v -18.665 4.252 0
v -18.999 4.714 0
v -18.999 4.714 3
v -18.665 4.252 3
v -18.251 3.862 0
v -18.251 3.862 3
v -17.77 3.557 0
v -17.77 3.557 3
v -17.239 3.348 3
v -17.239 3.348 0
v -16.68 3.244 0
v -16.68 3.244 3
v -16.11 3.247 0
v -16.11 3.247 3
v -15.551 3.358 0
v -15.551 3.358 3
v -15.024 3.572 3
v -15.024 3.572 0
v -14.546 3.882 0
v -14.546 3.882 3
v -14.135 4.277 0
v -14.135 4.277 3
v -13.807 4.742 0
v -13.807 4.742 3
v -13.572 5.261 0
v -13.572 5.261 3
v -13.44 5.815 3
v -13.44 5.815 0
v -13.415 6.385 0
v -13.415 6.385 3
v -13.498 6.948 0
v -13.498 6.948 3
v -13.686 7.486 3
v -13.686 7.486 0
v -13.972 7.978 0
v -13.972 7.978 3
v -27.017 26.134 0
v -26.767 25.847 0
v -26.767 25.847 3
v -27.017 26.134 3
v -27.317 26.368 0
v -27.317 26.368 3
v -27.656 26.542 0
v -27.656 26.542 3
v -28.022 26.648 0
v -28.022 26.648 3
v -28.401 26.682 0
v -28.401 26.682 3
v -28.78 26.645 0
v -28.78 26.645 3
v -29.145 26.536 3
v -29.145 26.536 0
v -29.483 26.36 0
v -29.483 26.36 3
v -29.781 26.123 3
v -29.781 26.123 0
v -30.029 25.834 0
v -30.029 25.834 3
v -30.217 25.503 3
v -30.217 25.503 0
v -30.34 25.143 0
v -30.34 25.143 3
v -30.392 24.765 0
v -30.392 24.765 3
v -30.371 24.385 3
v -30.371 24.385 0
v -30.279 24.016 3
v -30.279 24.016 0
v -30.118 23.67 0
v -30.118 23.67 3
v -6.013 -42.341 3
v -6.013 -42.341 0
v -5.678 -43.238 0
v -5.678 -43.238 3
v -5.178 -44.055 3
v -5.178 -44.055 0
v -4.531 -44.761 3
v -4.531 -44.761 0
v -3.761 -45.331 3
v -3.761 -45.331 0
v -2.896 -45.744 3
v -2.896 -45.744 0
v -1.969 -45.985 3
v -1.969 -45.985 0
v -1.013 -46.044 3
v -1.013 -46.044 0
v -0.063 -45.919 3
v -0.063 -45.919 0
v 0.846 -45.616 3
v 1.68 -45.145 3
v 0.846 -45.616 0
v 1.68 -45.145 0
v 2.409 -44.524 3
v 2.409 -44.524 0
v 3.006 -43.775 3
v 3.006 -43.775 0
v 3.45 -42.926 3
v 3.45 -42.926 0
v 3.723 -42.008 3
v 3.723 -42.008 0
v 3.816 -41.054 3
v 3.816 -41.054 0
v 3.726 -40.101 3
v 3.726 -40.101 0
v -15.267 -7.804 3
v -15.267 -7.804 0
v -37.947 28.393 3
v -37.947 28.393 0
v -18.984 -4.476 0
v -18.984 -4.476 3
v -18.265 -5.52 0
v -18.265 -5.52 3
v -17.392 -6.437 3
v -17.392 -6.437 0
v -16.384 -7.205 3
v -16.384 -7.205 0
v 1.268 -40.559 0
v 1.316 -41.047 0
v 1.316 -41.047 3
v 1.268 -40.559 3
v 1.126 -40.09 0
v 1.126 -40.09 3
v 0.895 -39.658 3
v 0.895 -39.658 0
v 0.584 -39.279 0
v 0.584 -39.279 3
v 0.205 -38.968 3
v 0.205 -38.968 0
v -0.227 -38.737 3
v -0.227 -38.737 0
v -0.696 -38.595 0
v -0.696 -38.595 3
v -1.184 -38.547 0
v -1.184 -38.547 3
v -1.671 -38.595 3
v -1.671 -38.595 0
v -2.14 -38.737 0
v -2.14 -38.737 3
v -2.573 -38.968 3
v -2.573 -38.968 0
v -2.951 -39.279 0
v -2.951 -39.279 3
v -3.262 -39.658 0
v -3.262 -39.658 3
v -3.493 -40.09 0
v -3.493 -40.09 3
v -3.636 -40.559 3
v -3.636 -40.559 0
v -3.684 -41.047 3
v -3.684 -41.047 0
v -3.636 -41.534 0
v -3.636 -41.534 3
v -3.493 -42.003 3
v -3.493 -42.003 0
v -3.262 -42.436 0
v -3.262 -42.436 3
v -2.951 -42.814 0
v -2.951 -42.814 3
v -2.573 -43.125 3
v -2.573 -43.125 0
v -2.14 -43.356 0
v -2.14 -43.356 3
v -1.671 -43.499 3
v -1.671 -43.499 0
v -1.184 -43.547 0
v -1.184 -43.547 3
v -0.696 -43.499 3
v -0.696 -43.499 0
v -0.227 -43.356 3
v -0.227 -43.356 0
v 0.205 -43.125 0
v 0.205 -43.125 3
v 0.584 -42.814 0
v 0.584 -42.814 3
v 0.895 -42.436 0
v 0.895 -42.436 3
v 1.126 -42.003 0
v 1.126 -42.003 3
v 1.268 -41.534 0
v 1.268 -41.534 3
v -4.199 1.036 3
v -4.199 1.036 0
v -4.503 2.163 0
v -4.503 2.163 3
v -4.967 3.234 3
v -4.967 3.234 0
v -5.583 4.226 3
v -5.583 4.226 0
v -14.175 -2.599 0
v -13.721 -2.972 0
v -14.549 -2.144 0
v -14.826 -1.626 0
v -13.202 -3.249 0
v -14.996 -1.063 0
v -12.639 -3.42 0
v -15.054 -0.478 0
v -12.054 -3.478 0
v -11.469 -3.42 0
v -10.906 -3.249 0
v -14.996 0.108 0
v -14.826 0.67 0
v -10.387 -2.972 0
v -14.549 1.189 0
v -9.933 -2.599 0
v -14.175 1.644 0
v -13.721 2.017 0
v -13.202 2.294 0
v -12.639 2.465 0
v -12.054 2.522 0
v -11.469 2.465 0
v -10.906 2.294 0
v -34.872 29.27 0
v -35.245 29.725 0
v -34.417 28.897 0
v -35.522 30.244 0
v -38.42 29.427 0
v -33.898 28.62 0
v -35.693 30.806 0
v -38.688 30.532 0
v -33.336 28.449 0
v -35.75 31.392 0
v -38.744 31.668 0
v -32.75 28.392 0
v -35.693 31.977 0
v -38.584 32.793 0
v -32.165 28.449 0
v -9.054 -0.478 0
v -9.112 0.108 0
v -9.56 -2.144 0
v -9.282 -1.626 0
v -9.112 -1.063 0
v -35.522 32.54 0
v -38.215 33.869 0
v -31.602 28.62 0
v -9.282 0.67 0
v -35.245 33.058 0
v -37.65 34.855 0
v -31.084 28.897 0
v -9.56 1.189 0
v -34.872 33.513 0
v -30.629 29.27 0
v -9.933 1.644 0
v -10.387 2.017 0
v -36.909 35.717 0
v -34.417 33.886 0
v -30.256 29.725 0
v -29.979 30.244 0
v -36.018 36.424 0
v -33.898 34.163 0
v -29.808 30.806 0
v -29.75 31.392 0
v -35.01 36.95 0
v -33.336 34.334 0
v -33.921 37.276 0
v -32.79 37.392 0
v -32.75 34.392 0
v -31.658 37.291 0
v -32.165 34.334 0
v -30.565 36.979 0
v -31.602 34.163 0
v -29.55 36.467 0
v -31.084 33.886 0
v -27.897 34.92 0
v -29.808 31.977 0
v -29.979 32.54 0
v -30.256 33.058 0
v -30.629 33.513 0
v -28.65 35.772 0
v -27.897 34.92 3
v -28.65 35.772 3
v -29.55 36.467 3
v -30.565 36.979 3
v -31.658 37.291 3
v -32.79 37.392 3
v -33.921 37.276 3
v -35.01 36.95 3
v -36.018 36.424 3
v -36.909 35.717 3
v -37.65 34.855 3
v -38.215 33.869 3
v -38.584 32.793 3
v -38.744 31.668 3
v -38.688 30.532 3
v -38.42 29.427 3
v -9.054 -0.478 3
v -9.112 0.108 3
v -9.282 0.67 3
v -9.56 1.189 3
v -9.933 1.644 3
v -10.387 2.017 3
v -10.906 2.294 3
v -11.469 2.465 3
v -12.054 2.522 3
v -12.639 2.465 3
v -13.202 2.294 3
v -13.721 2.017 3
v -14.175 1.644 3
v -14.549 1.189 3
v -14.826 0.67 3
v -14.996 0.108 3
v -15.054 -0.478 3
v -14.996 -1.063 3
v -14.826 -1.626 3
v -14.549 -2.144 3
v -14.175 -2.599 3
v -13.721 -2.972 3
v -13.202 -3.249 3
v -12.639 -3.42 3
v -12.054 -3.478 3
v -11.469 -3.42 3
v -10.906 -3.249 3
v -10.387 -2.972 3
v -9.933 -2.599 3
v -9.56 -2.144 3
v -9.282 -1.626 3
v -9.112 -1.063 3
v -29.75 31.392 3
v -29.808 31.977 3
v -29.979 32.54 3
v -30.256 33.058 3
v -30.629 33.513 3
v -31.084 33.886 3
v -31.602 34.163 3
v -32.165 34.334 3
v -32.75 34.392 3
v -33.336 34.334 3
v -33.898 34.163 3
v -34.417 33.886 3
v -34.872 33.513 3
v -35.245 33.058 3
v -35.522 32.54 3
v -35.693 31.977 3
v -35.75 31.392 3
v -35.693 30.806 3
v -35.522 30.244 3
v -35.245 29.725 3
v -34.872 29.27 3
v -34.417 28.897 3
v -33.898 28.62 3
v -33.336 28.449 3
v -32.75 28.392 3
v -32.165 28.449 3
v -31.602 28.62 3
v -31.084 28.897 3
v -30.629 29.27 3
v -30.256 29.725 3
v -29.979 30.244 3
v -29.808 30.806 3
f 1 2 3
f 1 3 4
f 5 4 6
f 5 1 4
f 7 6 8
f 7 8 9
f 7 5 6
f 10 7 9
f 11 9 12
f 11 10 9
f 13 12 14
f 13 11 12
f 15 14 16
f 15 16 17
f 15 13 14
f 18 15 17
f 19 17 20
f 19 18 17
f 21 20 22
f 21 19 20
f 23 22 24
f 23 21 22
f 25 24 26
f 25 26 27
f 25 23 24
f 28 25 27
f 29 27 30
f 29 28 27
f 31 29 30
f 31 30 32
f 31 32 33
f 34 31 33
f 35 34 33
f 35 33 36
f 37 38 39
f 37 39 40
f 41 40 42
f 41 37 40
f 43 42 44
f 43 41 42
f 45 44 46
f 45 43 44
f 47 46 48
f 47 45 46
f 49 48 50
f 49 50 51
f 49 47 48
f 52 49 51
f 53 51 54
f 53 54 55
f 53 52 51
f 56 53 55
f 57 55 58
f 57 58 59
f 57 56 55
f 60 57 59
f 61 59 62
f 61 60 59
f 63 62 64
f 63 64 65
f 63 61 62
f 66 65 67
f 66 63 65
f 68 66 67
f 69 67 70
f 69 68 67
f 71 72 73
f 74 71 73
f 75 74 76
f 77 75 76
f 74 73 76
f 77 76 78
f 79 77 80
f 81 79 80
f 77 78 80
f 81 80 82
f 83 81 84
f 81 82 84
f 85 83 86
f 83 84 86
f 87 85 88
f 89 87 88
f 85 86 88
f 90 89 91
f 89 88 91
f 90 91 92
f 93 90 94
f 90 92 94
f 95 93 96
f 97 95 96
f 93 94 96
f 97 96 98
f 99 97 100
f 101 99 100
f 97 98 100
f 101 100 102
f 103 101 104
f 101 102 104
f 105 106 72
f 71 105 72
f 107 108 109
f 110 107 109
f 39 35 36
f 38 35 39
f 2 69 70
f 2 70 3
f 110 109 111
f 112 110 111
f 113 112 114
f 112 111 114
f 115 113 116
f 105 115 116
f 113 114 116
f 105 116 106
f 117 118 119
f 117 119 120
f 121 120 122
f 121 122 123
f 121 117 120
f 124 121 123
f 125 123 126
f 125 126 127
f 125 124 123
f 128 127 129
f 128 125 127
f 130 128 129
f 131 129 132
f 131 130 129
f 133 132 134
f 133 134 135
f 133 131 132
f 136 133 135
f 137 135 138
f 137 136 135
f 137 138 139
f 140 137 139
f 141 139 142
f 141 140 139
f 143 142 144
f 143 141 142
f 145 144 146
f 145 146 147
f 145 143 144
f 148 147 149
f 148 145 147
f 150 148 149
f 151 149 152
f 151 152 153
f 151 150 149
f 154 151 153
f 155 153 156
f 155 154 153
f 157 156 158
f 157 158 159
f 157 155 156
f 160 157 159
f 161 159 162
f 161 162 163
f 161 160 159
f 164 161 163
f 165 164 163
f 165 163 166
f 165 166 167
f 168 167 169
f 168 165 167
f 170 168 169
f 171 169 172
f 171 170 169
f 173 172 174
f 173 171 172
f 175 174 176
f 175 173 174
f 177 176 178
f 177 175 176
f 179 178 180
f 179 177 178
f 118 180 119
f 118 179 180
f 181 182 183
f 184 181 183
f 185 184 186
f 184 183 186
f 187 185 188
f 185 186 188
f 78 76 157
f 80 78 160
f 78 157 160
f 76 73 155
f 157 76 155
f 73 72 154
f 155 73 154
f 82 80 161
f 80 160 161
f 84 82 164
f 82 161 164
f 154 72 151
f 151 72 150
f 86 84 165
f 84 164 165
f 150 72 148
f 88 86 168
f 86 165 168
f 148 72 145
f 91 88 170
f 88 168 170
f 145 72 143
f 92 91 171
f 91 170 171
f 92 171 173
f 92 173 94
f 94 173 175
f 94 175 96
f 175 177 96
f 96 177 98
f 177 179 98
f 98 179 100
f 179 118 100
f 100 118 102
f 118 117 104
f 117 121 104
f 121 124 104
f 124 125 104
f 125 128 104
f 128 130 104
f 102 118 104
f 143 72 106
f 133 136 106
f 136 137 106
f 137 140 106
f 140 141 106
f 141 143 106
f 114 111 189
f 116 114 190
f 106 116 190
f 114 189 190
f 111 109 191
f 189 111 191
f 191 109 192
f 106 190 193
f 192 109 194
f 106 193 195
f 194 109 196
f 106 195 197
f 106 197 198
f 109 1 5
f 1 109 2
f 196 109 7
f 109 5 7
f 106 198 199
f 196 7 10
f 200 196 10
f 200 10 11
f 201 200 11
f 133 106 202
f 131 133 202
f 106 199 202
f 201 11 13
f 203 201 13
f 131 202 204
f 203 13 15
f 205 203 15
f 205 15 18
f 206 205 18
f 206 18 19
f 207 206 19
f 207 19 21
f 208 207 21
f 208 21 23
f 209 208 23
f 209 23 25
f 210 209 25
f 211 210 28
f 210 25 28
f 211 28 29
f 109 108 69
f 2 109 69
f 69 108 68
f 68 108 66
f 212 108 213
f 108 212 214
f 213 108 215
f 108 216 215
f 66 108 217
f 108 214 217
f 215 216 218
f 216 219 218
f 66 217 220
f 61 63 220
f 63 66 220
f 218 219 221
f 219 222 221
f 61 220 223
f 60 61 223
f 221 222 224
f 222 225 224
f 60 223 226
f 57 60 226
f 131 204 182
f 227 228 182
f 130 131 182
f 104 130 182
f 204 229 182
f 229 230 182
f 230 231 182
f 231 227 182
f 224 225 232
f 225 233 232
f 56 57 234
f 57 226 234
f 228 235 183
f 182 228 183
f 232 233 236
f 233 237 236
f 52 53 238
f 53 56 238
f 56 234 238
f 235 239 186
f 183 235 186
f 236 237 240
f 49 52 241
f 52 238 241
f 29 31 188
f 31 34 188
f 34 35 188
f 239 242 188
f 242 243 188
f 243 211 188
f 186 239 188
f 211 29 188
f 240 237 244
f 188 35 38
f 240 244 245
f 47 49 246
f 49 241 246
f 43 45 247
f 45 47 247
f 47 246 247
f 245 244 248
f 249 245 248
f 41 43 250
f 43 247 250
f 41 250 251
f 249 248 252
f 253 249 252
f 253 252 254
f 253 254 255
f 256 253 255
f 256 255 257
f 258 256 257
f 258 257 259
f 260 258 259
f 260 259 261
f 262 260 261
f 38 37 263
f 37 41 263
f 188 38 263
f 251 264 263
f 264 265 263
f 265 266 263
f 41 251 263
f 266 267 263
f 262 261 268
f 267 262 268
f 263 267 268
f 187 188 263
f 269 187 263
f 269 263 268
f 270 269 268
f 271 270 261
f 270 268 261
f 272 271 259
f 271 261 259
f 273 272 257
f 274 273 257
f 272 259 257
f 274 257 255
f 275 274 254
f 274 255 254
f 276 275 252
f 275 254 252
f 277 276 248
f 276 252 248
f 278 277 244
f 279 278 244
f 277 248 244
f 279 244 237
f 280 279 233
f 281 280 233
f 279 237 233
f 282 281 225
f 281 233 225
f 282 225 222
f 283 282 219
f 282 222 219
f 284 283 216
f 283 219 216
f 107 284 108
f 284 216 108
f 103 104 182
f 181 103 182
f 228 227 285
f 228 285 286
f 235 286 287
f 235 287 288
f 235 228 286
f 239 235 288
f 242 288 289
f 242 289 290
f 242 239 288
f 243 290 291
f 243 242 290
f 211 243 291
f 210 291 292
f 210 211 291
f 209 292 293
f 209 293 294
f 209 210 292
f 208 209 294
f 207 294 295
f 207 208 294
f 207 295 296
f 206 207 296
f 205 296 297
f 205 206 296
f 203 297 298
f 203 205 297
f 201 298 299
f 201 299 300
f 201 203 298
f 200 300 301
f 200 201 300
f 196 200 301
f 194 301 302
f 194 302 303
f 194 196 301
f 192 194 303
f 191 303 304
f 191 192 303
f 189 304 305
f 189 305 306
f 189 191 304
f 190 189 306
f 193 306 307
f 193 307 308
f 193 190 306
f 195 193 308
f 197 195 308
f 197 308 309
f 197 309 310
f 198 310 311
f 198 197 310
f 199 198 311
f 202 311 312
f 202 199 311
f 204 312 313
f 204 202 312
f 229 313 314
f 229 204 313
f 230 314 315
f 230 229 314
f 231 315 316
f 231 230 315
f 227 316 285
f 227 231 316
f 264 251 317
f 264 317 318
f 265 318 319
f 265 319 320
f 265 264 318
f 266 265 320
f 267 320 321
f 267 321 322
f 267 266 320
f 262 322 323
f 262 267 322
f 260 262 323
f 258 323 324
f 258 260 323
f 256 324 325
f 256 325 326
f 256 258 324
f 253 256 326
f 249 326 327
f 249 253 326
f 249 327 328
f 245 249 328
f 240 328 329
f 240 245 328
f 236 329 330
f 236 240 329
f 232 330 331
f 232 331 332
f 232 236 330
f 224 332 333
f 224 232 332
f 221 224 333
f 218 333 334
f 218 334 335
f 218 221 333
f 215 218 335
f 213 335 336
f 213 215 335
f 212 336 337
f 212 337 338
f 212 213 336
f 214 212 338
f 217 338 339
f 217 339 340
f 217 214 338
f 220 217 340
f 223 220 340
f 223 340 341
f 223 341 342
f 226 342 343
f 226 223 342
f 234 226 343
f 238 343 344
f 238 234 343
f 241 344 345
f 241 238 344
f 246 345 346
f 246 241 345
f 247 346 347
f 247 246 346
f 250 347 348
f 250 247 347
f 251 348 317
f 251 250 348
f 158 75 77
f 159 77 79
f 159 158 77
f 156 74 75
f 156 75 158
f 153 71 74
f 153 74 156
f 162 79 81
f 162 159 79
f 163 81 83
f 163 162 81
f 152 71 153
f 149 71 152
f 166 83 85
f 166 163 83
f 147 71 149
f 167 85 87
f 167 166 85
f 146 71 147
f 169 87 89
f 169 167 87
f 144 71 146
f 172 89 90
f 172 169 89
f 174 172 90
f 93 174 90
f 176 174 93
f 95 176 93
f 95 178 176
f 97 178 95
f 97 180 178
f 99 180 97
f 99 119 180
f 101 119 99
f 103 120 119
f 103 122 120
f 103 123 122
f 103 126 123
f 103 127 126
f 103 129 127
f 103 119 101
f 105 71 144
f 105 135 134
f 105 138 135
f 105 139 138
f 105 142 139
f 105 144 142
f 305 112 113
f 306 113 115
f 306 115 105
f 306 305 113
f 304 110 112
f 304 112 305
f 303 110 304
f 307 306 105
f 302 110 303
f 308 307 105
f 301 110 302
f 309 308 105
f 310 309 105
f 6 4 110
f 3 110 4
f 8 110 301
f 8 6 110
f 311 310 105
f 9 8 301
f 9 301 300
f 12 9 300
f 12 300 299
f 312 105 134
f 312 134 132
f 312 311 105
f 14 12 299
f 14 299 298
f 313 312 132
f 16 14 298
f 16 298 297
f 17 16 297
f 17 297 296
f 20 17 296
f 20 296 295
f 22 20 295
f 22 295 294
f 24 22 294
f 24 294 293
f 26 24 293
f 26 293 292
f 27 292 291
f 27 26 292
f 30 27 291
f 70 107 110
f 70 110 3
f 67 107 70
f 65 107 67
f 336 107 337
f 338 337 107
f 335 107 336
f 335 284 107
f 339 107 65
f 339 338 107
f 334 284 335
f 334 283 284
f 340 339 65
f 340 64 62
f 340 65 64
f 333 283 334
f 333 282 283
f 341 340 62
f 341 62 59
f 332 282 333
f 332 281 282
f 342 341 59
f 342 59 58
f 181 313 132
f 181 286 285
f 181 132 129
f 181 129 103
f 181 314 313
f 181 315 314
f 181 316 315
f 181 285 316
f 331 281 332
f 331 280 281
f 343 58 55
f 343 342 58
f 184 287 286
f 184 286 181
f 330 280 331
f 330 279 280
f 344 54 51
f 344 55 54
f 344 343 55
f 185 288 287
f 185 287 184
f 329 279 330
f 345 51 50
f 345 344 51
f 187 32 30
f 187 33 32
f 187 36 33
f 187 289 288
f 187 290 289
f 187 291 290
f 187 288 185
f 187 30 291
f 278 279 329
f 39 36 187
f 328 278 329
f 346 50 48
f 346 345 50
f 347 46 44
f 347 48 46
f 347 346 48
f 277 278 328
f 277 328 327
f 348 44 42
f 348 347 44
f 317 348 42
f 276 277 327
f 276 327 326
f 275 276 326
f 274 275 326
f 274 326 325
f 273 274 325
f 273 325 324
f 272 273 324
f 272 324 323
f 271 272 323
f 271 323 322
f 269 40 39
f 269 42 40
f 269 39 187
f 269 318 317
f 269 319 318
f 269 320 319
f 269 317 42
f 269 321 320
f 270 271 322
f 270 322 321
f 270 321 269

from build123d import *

# Parameters (mm, degrees)
SKETCH_2_R      = 2.5
SKETCH_2_R_2    = 3
EXTRUDE_1_DEPTH = 3


with BuildPart() as part:
    # 草图2 → 凸台-拉伸1 (new body)
    with BuildSketch(Plane.XY):
        with BuildLine():
            Line((-37.947439952, 28.393304212), (-18.983503384, -4.475664586))
            ThreePointArc((-18.983503384, -4.475664586), (-17.391534203, -6.436907823), (-15.267421048, -7.804015799))
            Line((-15.267421048, -7.804015799), (-6.013345572, -42.340695651))
            ThreePointArc((-6.013345572, -42.340695651), (-0.063044856, -45.919391741), (3.726011827, -40.100784195))
            Line((3.726011827, -40.100784195), (-4.198551107, 1.035590248))
            ThreePointArc((-4.198551107, 1.035590248), (-4.715435995, 2.707212985), (-5.583372683, 4.226482041))
            Line((-5.583372683, 4.226482041), (-27.897341927, 34.919914183))
            ThreePointArc((-27.897341927, 34.919914183), (-36.018233875, 36.423789268), (-37.947439952, 28.393304212))
        make_face()
        with Locations((-1.18371644, -41.046600426)):
            Circle(SKETCH_2_R, mode=Mode.SUBTRACT)
        with Locations((-12.054116335, -0.477715722)):
            Circle(SKETCH_2_R_2, mode=Mode.SUBTRACT)
        with Locations((-32.750399665, 31.39176586)):
            Circle(SKETCH_2_R_2, mode=Mode.SUBTRACT)
        with BuildLine():
            Line((-30.118407474, 23.670491895), (-18.998908748, 4.713784689))
            ThreePointArc((-18.998908748, 4.713784689), (-14.77731151, 3.715637118), (-13.9720864, 7.978241292))
            Line((-13.9720864, 7.978241292), (-26.767192575, 25.846796296))
            ThreePointArc((-26.767192575, 25.846796296), (-29.482565455, 26.359742452), (-30.118407474, 23.670491895))
        make_face(mode=Mode.SUBTRACT)
    extrude(amount=EXTRUDE_1_DEPTH)


solid = part.part
